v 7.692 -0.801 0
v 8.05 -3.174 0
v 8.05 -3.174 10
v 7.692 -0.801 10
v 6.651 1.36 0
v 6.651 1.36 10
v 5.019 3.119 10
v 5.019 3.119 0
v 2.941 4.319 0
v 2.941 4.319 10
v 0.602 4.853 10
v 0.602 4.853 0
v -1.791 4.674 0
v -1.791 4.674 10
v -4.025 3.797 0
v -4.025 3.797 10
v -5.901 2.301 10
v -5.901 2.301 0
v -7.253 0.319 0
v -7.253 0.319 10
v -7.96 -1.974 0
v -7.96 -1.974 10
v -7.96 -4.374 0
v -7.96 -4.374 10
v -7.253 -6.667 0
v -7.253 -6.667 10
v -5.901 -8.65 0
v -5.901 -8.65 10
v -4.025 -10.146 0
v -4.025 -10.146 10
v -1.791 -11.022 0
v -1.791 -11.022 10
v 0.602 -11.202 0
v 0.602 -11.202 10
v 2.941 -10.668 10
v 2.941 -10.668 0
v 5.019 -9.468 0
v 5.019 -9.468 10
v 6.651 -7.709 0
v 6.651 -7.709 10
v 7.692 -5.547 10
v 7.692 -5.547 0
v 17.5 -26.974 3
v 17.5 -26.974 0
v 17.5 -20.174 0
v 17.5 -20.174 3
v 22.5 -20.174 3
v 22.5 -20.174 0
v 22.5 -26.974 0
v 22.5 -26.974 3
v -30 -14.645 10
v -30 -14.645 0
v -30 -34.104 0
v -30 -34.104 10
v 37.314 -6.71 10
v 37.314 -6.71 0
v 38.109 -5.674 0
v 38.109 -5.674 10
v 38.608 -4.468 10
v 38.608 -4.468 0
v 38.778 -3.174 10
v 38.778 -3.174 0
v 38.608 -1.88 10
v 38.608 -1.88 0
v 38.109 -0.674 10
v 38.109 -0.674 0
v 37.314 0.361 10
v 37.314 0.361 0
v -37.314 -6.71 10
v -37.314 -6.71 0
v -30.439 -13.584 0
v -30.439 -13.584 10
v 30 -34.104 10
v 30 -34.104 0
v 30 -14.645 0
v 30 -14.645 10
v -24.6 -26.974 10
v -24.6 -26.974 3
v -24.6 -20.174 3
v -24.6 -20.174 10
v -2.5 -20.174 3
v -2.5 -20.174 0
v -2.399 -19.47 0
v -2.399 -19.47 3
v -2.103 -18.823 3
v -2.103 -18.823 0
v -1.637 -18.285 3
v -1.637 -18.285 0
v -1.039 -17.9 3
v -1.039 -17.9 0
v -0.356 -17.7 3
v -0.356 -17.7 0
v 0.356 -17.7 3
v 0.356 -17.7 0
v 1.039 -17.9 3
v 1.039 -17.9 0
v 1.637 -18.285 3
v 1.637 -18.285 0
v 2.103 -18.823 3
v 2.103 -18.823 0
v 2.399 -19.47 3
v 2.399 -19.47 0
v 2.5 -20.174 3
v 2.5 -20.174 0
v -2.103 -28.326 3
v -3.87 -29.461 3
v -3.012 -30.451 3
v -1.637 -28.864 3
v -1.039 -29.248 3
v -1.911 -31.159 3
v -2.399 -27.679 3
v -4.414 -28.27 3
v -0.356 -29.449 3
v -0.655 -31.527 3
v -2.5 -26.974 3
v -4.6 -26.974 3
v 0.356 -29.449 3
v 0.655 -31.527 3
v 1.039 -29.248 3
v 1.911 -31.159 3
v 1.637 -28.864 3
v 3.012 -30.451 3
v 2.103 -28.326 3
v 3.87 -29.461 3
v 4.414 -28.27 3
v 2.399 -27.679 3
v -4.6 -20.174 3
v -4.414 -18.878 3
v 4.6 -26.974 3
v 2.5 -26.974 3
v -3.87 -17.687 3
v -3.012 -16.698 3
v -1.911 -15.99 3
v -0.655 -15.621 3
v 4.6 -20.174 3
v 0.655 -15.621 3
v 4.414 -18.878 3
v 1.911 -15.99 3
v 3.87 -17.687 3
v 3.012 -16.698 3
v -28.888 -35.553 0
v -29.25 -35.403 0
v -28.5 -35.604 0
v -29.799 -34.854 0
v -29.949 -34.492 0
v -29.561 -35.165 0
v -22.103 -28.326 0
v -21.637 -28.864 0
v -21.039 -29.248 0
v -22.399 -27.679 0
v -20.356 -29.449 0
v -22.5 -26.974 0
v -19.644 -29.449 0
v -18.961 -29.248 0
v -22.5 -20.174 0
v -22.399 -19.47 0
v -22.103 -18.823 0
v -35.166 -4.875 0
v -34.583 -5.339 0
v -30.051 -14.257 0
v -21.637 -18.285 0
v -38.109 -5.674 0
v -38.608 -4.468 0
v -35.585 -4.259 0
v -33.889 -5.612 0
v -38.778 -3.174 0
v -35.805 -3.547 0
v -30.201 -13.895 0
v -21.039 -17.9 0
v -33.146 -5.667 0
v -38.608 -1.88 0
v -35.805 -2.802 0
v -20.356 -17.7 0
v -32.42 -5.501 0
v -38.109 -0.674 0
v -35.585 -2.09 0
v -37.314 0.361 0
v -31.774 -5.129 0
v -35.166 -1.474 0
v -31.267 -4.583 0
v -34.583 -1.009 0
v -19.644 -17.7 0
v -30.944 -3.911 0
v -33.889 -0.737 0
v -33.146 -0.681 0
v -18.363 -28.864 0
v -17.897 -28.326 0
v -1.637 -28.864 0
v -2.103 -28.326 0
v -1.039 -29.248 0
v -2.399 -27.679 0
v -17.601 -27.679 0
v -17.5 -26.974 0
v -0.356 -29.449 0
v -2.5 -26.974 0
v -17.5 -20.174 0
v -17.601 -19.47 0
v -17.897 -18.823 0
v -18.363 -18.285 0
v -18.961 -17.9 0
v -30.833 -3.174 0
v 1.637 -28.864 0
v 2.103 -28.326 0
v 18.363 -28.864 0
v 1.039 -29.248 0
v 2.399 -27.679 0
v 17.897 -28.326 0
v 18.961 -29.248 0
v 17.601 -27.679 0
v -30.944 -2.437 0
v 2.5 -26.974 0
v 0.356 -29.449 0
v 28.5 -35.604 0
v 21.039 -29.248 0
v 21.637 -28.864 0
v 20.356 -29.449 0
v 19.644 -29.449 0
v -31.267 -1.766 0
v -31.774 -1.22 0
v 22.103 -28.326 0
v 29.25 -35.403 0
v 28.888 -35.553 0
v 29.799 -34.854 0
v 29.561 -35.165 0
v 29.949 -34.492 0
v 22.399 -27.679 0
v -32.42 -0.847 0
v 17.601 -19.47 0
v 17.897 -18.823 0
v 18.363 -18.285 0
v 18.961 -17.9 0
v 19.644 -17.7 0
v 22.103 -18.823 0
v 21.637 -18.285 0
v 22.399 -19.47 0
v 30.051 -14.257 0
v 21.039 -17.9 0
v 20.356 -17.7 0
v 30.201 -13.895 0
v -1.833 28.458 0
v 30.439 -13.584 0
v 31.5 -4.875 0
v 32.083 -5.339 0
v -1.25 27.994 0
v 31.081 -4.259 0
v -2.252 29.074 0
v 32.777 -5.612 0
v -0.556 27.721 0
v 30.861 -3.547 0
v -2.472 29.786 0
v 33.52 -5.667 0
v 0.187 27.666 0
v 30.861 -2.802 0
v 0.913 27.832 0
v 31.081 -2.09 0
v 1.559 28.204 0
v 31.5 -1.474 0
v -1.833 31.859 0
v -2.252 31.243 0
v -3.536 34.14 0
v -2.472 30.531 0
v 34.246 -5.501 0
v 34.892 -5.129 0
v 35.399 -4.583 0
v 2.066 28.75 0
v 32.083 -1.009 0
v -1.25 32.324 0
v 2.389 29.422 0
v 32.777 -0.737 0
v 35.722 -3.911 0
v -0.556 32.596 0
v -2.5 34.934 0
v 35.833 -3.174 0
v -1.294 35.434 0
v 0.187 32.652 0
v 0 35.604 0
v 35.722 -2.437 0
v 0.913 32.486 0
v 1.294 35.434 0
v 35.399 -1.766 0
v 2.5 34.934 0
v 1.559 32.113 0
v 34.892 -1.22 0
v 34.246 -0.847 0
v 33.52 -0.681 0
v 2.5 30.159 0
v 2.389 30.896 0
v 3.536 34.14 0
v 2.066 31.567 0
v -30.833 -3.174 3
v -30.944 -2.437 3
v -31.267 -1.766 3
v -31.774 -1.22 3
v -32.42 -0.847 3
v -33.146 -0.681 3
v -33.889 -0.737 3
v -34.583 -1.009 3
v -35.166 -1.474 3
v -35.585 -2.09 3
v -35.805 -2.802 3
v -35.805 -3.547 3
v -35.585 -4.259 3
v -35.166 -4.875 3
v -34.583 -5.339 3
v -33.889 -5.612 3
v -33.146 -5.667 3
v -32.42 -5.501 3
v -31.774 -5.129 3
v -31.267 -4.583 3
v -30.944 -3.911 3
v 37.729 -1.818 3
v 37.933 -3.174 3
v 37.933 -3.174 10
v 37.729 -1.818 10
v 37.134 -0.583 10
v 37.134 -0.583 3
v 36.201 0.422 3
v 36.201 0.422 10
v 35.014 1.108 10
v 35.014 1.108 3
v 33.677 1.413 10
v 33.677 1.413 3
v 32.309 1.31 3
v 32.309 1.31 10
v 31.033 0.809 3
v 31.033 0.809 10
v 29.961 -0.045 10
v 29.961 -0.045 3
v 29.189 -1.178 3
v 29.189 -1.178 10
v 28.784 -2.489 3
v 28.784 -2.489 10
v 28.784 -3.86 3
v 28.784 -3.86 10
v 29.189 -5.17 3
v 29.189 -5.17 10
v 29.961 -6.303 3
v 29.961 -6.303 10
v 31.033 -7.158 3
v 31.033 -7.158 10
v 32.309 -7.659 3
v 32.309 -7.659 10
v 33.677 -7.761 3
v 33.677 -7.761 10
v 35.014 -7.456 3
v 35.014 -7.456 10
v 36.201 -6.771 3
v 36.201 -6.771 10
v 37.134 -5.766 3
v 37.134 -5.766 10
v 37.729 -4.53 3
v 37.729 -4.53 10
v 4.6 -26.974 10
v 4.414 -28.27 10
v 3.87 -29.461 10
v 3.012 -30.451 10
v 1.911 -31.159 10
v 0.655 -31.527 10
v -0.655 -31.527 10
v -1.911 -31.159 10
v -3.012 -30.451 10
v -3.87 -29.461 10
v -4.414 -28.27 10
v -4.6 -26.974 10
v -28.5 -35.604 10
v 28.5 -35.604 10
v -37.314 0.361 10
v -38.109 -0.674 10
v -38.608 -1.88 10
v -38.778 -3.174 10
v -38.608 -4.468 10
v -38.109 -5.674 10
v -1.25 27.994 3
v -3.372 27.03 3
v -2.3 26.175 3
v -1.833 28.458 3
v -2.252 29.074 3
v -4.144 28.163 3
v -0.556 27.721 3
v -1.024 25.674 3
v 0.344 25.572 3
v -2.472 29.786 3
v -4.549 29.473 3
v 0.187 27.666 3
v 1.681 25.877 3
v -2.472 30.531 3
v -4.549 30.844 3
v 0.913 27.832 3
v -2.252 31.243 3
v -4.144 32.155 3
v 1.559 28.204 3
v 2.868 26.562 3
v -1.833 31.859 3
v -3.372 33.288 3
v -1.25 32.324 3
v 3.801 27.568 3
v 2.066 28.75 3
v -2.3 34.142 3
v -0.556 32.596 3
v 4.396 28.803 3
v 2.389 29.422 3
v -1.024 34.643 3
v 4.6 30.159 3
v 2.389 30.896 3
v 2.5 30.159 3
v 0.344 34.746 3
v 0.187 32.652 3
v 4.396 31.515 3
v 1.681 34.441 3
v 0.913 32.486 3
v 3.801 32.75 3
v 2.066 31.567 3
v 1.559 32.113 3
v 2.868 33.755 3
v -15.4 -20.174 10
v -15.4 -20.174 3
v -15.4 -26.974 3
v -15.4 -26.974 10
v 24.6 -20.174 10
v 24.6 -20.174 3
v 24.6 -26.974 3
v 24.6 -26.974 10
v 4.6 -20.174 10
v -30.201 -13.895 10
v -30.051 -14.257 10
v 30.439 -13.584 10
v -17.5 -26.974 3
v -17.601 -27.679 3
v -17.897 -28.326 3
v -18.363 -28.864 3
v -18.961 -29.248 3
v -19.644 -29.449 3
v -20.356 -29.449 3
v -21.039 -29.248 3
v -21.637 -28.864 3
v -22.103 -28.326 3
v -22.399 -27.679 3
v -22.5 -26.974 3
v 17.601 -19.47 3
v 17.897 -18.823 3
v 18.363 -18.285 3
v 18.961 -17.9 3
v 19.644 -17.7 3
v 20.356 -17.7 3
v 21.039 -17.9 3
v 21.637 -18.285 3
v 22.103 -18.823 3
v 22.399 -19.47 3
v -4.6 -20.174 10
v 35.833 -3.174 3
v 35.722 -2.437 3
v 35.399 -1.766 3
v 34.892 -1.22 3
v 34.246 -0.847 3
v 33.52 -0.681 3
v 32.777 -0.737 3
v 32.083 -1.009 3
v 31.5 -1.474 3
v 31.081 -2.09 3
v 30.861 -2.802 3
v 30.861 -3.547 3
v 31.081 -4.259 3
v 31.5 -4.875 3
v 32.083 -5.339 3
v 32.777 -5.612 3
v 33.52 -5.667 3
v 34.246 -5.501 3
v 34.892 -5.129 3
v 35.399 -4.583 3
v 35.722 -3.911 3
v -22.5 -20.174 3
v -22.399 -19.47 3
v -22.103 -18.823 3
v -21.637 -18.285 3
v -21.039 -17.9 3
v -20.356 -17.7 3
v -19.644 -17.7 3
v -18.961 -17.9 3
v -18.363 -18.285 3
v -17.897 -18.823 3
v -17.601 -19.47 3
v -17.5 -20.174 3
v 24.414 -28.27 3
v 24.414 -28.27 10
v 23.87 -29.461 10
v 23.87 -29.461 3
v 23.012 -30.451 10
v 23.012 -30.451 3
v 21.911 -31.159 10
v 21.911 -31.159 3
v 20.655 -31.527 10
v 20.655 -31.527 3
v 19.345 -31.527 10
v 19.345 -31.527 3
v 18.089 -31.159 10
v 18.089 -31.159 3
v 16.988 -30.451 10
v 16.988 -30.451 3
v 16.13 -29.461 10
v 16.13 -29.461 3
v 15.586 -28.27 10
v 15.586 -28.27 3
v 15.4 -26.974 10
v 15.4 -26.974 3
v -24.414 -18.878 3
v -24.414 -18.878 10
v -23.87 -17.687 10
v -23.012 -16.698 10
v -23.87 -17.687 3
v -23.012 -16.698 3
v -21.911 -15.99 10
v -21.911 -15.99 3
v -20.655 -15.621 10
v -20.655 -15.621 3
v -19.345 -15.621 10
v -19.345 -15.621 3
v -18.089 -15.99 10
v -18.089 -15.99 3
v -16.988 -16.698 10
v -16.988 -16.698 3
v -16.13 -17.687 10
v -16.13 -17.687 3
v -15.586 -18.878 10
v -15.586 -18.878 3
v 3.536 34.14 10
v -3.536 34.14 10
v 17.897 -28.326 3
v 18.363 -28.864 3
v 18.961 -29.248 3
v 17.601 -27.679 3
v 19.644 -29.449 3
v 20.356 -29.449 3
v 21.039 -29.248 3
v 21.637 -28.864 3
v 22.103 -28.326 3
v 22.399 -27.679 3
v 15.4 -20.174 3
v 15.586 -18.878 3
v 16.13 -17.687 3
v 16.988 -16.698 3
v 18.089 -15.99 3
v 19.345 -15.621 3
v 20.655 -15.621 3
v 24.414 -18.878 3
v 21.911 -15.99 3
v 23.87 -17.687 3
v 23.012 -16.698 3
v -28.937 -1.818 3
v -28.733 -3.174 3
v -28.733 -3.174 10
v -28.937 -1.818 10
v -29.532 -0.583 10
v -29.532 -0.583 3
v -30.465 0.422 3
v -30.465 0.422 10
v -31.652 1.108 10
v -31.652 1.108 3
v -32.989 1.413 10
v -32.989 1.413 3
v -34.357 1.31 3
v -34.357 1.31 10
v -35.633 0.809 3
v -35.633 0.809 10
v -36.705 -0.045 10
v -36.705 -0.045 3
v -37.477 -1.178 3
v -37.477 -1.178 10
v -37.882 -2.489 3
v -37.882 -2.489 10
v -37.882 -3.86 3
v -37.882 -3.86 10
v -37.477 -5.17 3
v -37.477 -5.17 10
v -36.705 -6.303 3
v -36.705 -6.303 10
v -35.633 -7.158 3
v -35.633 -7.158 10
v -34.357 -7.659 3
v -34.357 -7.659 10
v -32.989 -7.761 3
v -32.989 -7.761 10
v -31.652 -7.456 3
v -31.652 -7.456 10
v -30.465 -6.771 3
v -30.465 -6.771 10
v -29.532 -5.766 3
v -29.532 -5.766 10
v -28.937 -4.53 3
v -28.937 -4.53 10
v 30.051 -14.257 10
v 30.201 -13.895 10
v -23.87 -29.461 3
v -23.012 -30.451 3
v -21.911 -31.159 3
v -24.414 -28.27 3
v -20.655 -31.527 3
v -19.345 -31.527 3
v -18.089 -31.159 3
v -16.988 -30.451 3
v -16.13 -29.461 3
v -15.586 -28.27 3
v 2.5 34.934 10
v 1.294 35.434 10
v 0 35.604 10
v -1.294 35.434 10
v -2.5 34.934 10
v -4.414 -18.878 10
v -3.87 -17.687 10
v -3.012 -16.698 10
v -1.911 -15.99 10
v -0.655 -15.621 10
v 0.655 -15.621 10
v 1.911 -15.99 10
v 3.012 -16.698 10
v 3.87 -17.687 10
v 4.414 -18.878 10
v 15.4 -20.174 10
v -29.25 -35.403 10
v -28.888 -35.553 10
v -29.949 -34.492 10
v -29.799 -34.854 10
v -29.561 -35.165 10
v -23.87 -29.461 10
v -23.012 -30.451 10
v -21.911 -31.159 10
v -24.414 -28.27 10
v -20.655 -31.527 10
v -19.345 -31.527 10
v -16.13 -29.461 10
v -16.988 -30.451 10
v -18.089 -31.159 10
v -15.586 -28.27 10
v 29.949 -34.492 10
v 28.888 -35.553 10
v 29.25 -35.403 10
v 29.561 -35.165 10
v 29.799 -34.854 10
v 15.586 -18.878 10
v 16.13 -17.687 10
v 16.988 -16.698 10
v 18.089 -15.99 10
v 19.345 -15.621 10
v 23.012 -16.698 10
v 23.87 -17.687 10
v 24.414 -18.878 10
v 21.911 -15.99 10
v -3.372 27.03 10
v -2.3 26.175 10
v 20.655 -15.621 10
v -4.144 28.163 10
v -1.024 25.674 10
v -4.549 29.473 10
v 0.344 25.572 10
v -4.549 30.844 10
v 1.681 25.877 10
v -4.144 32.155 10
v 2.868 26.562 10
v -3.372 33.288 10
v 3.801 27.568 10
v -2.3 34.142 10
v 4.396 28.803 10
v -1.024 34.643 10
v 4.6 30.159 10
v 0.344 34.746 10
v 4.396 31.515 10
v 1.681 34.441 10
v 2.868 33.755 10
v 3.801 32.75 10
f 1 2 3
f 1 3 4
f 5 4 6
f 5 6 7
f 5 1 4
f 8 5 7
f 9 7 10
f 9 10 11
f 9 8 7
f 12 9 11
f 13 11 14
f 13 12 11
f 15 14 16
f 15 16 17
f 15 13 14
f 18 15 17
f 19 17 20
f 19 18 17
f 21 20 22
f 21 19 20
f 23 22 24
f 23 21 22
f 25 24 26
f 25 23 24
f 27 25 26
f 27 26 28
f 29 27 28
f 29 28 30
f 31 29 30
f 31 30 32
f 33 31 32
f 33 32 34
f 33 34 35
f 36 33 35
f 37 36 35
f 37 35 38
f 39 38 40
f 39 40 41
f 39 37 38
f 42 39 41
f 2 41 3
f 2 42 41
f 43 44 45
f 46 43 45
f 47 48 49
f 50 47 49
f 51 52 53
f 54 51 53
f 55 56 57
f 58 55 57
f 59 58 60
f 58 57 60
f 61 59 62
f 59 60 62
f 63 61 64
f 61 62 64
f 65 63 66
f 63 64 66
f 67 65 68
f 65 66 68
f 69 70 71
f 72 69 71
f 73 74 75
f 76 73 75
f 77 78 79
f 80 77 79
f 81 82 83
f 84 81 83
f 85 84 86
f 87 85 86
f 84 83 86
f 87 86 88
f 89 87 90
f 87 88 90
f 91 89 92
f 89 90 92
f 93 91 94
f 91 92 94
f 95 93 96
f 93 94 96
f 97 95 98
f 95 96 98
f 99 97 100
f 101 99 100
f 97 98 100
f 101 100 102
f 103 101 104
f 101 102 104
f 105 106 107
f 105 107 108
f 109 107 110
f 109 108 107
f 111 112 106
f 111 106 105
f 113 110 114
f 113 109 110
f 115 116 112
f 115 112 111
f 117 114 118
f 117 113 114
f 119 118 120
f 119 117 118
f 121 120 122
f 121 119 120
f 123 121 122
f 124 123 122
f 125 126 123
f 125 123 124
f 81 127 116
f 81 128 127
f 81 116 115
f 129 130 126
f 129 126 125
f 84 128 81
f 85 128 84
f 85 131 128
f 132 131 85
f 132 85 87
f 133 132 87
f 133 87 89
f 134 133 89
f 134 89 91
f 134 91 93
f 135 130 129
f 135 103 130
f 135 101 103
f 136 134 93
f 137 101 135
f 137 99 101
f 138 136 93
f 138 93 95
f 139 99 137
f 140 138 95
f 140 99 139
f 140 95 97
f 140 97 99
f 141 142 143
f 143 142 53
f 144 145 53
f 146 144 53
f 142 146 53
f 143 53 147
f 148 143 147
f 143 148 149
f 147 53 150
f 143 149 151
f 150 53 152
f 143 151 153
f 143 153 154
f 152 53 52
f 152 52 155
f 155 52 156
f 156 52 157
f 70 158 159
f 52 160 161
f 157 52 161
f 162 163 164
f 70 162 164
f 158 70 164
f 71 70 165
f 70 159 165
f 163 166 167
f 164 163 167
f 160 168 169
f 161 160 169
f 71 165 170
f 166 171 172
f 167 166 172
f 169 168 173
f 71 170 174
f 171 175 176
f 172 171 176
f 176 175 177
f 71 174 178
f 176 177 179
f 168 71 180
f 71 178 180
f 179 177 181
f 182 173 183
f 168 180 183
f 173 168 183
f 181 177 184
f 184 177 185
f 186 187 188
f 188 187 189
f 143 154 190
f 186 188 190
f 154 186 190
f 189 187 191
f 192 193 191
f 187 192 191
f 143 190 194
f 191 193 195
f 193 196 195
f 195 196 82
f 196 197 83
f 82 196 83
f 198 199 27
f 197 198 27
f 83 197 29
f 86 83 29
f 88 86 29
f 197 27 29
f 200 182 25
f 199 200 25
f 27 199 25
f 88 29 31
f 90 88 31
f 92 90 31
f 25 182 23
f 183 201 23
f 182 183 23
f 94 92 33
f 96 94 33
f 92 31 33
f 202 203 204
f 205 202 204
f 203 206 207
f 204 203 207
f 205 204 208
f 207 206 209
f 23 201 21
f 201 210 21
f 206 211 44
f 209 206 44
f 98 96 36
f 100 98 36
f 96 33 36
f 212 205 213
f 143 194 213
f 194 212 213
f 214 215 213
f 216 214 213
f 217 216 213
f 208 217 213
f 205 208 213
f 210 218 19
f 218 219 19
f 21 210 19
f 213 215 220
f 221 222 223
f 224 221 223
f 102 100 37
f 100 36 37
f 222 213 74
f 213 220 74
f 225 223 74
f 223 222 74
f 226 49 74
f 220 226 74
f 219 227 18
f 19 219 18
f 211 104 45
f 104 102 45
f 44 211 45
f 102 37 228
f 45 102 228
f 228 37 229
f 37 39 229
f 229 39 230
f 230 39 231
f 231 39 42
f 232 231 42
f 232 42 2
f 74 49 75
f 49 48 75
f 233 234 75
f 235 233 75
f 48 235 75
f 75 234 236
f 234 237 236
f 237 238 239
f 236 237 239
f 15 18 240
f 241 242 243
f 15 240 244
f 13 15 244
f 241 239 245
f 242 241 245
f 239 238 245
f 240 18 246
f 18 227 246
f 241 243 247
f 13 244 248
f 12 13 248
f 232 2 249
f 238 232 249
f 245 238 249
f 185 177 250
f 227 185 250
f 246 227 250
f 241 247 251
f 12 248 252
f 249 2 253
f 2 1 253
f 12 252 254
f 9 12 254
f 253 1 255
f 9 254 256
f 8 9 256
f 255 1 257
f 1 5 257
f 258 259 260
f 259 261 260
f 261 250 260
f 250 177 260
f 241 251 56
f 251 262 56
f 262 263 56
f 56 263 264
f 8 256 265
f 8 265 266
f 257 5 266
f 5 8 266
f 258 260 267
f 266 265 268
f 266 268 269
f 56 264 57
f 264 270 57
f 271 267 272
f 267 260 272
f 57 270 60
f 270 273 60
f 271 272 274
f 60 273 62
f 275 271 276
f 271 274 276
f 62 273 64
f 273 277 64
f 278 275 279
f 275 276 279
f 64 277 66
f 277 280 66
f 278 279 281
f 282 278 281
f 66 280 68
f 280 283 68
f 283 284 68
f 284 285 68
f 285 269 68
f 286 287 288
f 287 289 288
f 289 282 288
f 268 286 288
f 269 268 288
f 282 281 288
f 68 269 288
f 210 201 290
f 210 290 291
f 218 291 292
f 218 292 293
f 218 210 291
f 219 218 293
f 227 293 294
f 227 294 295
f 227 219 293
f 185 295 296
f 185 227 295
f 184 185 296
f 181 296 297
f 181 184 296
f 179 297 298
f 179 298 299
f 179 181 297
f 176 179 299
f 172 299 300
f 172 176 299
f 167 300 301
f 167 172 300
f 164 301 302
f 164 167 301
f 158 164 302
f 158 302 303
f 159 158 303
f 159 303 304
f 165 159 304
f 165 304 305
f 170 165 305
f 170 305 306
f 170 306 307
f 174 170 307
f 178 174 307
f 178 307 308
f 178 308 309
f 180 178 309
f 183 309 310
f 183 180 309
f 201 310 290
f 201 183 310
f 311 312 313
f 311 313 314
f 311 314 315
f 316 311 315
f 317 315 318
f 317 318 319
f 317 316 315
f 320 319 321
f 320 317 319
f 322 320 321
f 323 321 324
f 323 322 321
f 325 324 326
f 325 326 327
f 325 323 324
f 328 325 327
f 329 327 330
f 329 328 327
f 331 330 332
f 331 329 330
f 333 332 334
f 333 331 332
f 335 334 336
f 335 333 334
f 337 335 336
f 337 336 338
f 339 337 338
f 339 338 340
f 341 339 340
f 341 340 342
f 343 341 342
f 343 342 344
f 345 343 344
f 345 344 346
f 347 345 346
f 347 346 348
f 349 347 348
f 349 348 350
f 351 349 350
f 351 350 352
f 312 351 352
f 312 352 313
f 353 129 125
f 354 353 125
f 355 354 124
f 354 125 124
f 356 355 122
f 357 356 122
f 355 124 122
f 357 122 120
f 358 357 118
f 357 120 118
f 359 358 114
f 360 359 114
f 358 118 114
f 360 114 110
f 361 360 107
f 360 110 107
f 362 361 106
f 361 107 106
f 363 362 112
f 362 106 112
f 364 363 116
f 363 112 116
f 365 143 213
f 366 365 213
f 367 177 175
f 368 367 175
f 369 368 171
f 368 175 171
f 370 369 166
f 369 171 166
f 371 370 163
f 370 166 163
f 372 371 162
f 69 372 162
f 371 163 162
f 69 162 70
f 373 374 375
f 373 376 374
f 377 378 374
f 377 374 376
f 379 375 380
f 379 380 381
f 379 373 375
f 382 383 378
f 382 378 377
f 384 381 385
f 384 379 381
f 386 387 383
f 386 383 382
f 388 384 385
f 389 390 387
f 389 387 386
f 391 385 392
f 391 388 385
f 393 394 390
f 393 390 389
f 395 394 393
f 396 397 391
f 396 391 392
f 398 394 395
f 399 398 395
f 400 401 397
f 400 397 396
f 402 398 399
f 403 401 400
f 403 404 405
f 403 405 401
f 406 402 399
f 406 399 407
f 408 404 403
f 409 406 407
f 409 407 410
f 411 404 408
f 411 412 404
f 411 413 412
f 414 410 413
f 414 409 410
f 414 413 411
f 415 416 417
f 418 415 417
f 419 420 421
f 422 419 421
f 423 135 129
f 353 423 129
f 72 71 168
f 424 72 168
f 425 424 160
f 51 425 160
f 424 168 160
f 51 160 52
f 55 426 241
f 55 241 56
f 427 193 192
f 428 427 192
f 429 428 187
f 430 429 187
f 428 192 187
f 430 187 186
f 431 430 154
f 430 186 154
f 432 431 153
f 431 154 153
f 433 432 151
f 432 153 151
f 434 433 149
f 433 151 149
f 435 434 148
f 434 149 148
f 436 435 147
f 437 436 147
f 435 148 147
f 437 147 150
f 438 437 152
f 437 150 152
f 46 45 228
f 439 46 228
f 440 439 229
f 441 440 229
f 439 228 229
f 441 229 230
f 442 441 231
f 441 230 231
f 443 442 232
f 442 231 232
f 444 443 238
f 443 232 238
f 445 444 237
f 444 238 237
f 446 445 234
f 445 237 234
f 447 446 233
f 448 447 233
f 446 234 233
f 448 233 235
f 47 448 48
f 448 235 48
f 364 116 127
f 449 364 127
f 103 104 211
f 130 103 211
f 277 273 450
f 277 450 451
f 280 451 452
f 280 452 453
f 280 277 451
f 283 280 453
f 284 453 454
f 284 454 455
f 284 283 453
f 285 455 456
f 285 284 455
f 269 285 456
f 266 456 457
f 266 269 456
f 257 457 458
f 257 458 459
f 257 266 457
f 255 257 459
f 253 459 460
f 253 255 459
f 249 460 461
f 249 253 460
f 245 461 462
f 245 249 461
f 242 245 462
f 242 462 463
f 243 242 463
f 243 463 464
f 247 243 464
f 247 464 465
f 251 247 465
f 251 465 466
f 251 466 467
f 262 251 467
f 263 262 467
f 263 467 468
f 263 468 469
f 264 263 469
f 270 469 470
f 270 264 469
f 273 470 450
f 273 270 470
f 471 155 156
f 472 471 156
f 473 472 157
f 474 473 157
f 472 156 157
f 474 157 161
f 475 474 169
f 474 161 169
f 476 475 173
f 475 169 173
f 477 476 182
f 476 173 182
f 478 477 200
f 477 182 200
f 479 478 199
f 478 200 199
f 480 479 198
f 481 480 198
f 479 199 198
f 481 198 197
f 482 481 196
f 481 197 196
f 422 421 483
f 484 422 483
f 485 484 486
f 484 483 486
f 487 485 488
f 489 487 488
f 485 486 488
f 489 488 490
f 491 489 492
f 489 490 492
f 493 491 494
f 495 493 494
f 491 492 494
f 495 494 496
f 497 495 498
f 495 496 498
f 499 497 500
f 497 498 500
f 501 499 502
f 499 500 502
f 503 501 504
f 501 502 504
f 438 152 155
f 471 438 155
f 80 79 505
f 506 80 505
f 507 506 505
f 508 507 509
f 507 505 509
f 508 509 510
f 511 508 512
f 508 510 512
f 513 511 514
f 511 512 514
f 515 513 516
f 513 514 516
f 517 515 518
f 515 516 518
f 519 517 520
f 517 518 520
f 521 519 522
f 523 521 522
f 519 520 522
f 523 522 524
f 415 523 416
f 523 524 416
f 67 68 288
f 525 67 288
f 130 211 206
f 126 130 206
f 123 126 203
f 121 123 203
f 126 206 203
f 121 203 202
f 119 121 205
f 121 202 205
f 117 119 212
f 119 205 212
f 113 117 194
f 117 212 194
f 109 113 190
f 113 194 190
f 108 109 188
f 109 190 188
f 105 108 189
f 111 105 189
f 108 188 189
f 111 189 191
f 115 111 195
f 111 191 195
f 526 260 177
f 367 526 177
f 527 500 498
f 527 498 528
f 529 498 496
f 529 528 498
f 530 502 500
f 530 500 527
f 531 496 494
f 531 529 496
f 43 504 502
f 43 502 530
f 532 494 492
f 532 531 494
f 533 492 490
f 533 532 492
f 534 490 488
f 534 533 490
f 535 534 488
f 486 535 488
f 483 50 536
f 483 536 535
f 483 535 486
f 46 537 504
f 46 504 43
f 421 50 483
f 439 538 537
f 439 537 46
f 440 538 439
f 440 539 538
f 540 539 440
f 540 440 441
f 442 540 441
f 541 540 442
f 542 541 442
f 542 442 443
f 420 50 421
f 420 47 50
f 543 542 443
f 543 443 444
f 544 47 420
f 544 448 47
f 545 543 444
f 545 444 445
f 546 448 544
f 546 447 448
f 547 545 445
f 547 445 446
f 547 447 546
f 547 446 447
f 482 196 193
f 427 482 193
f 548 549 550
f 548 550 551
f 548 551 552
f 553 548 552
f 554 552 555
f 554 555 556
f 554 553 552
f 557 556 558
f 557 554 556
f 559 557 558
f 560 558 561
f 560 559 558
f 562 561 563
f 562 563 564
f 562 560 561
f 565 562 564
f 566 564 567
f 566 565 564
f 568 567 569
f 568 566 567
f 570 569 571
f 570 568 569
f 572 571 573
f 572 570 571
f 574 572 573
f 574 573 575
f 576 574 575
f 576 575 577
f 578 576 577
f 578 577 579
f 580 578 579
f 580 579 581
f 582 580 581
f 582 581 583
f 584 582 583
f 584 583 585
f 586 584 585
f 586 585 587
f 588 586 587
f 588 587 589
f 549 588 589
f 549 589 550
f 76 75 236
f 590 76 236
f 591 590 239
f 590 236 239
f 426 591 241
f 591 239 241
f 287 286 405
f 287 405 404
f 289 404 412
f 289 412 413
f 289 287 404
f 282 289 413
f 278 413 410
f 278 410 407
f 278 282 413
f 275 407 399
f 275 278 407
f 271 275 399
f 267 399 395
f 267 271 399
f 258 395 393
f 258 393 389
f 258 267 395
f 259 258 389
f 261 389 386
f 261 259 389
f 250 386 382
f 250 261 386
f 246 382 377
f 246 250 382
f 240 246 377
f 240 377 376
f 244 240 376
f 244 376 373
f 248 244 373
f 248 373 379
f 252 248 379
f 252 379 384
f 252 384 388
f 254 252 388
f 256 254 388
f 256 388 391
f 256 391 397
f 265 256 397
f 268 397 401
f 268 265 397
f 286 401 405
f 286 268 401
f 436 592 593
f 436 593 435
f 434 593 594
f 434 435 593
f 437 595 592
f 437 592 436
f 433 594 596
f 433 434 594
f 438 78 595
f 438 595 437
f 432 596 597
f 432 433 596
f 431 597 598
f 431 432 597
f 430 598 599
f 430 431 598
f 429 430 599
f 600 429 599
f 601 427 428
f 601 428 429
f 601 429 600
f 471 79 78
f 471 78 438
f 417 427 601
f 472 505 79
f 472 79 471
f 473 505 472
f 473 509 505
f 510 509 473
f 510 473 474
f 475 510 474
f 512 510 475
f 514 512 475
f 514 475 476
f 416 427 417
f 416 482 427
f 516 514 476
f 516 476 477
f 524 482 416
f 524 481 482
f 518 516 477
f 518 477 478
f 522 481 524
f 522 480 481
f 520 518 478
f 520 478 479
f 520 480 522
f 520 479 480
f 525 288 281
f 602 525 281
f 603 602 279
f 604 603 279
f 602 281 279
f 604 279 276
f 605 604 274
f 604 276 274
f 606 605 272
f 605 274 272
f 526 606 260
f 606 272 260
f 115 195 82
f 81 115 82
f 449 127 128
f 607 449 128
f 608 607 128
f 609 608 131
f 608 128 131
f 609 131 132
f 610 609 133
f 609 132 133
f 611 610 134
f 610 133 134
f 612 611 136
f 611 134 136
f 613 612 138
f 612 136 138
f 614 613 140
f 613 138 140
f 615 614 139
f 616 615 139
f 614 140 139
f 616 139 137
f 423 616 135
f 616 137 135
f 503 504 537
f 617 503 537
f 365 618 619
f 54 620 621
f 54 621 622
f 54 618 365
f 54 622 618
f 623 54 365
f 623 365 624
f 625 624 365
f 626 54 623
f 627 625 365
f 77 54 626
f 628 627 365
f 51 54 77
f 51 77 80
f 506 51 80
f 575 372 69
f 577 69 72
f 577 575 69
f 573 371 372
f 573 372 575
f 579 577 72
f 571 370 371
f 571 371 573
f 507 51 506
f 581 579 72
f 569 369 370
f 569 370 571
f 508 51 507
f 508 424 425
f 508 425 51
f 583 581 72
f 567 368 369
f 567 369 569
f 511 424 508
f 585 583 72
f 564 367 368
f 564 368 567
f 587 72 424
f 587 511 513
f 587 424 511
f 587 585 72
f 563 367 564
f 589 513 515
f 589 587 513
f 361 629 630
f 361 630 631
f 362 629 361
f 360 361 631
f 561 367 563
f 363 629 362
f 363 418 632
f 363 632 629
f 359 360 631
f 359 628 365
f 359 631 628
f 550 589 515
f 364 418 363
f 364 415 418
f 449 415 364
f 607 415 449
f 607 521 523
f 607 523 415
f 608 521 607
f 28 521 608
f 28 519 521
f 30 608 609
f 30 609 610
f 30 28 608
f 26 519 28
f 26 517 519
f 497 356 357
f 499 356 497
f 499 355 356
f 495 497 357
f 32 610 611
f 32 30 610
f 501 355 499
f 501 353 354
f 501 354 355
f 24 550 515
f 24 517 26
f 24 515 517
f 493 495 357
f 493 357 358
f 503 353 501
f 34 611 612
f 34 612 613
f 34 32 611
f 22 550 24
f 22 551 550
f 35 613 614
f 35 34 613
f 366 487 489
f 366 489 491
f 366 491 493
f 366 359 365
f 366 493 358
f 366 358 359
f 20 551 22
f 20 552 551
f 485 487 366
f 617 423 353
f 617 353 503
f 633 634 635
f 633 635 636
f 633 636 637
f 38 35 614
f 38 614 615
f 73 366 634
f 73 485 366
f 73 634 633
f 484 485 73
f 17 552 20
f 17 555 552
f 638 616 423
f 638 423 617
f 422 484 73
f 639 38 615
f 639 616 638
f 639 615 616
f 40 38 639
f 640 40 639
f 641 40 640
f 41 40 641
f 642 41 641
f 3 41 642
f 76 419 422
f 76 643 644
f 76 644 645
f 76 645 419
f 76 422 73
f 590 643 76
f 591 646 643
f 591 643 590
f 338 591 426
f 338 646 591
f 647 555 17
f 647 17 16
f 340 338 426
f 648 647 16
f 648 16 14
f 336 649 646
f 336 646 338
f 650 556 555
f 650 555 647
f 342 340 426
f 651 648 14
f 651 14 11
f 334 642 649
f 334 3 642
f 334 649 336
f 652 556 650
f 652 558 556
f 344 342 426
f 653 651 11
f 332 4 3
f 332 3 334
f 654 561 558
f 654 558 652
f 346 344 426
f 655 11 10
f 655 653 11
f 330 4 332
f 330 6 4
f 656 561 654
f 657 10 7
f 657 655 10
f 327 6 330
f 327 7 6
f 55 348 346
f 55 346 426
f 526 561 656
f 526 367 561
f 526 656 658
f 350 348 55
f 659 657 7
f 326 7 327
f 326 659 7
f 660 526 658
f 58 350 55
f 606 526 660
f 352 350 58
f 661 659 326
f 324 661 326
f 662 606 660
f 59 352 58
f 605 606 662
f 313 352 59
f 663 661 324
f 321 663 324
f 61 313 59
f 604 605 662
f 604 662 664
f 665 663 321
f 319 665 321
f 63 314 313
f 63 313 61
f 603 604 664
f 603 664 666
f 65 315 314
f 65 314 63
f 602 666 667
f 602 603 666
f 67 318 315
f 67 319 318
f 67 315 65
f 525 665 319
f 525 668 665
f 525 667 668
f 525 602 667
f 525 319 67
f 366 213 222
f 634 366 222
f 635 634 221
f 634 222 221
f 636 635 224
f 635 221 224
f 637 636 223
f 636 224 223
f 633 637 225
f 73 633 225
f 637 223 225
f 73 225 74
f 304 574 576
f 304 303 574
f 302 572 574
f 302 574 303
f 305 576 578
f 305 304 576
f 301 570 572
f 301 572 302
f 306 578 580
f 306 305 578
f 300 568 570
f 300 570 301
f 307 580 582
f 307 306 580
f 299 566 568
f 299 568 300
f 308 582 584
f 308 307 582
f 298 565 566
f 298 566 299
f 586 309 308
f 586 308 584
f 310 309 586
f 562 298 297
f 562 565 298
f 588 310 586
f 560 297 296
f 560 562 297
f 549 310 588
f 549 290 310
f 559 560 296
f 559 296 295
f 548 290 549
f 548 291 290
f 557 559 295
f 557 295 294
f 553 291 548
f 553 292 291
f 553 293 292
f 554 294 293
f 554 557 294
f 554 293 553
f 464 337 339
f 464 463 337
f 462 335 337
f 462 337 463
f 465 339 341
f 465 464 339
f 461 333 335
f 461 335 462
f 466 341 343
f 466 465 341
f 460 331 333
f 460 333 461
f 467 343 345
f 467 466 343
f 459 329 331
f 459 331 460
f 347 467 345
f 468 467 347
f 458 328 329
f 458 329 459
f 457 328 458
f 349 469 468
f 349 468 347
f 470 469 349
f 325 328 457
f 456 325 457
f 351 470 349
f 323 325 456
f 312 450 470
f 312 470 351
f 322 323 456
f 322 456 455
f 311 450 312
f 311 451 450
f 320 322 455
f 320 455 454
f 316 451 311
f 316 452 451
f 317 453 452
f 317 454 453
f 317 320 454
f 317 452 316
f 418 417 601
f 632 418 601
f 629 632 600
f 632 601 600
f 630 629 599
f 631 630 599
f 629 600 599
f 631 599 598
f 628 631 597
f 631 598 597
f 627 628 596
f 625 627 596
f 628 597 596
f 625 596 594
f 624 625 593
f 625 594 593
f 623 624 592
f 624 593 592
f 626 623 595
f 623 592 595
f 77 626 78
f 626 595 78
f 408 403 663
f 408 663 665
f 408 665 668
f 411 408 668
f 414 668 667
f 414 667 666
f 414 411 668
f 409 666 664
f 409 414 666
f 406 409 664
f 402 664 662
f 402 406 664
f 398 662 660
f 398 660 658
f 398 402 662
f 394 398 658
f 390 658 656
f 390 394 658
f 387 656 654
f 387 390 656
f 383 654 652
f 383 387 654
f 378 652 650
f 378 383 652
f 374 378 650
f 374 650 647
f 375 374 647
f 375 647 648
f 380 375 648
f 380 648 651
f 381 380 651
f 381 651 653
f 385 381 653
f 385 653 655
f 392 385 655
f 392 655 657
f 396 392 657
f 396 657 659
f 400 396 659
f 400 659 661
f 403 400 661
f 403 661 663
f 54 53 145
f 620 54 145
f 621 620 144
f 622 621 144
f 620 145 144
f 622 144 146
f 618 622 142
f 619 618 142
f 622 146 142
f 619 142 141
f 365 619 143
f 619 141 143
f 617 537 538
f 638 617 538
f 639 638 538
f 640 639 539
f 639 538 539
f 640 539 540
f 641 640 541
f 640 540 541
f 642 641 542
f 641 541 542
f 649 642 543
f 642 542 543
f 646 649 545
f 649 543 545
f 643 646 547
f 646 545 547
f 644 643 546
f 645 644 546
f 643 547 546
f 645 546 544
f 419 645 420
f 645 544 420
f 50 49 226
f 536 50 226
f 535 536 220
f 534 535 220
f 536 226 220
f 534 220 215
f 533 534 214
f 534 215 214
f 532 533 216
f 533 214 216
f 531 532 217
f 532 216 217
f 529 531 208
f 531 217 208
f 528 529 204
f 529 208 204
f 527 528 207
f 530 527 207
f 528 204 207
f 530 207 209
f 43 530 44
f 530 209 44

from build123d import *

# Parameters (mm, degrees)
F0_R     = 4.6
F0_R_2   = 8.05
F1_DEPTH = 10
F0_R_3   = 2.5
F2_DEPTH = 3


# Not quite as in the source:
# - ends of sketch curves that miss each other by under 0.0002 mm in the source are joined


with BuildPart() as f1:
    # F0 (on Top) → F1 (new body)
    with BuildSketch(Plane.XY):
        with BuildLine():
            ThreePointArc((-30, -34.104246), (-29.5606601718, -35.1649061718), (-28.5, -35.604246))
            Line((-28.5, -35.604246), (28.5, -35.604246))
            ThreePointArc((28.5, -35.604246), (29.5606601718, -35.1649061718), (30, -34.104246))
            Line((30, -34.104246), (30, -14.645125))
            ThreePointArc((30, -14.645125), (30.1141807012, -14.0710998515), (30.4393398282, -13.5844648282))
            Line((30.4393398282, -13.5844648282), (37.314025, -6.70978))
            ThreePointArc((37.314025, -6.70978), (38.778491, -3.174246), (37.3140249059, 0.3612879059))
            Line((37.3140249059, 0.3612879059), (3.535534, 34.139779))
            ThreePointArc((3.535534, 34.139779), (0, 35.604245), (-3.5355339059, 34.1397789059))
            Line((-3.5355339059, 34.1397789059), (-37.314025, 0.361288))
            ThreePointArc((-37.314025, 0.361288), (-38.778491, -3.174246), (-37.3140249059, -6.7097799059))
            Line((-37.3140249059, -6.7097799059), (-30.43934, -13.584465))
            ThreePointArc((-30.43934, -13.584465), (-30.1141807012, -14.0710998515), (-30, -14.645125))
            Line((-30, -14.645125), (-30, -34.104246))
        make_face()
        with BuildLine():
            ThreePointArc((-24.6, -20.174246), (-20, -15.574246), (-15.4, -20.174246))
            Line((-15.4, -20.174246), (-15.4, -26.974246))
            ThreePointArc((-15.4, -26.974246), (-20, -31.574246), (-24.6, -26.974246))
            Line((-24.6, -26.974246), (-24.6, -20.174246))
        make_face(mode=Mode.SUBTRACT)
        with Locations((-33.333, -3.174246)):
            Circle(F0_R, mode=Mode.SUBTRACT)
        with BuildLine():
            ThreePointArc((4.6, -26.974246), (0, -31.574246), (-4.6, -26.974246))
            Line((-4.6, -26.974246), (-4.6, -20.174246))
            ThreePointArc((-4.6, -20.174246), (0, -15.574246), (4.6, -20.174246))
            Line((4.6, -20.174246), (4.6, -26.974246))
        make_face(mode=Mode.SUBTRACT)
        with BuildLine():
            ThreePointArc((24.6, -26.974246), (20, -31.574246), (15.4, -26.974246))
            Line((15.4, -26.974246), (15.4, -20.174246))
            ThreePointArc((15.4, -20.174246), (20, -15.574246), (24.6, -20.174246))
            Line((24.6, -20.174246), (24.6, -26.974246))
        make_face(mode=Mode.SUBTRACT)
        with Locations((0, -3.174246)):
            Circle(F0_R_2, mode=Mode.SUBTRACT)
        with Locations((33.333, -3.174246)):
            Circle(F0_R, mode=Mode.SUBTRACT)
        with Locations((0, 30.158782)):
            Circle(F0_R, mode=Mode.SUBTRACT)
    extrude(amount=F1_DEPTH)

    # F0 (on Top) → F2 (join)
    with BuildSketch(Plane.XY):
        with Locations((-33.333, -3.174246)):
            Circle(F0_R)
        with Locations((-33.333, -3.174246)):
            Circle(F0_R_3, mode=Mode.SUBTRACT)
        with BuildLine():
            Line((-15.4, -26.974246), (-15.4, -20.174246))
            ThreePointArc((-15.4, -20.174246), (-20, -15.574246), (-24.6, -20.174246))
            Line((-24.6, -20.174246), (-24.6, -26.974246))
            ThreePointArc((-24.6, -26.974246), (-20, -31.574246), (-15.4, -26.974246))
        make_face()
        with BuildLine():
            ThreePointArc((-17.5, -26.974246), (-20, -29.474246), (-22.5, -26.974246))
            Line((-22.5, -26.974246), (-22.5, -20.174246))
            ThreePointArc((-22.5, -20.174246), (-20, -17.674246), (-17.5, -20.174246))
            Line((-17.5, -20.174246), (-17.5, -26.974246))
        make_face(mode=Mode.SUBTRACT)
        with BuildLine():
            Line((-4.6, -20.174246), (-4.6, -26.974246))
            ThreePointArc((-4.6, -26.974246), (0, -31.574246), (4.6, -26.974246))
            Line((4.6, -26.974246), (4.6, -20.174246))
            ThreePointArc((4.6, -20.174246), (0, -15.574246), (-4.6, -20.174246))
        make_face()
        with BuildLine():
            ThreePointArc((2.5, -26.974246), (0, -29.474246), (-2.5, -26.974246))
            Line((-2.5, -26.974246), (-2.5, -20.174246))
            ThreePointArc((-2.5, -20.174246), (0, -17.674246), (2.5, -20.174246))
            Line((2.5, -20.174246), (2.5, -26.974246))
        make_face(mode=Mode.SUBTRACT)
        with BuildLine():
            Line((15.4, -20.174246), (15.4, -26.974246))
            ThreePointArc((15.4, -26.974246), (20, -31.574246), (24.6, -26.974246))
            Line((24.6, -26.974246), (24.6, -20.174246))
            ThreePointArc((24.6, -20.174246), (20, -15.574246), (15.4, -20.174246))
        make_face()
        with BuildLine():
            ThreePointArc((22.5, -26.974246), (20, -29.474246), (17.5, -26.974246))
            Line((17.5, -26.974246), (17.5, -20.174246))
            ThreePointArc((17.5, -20.174246), (20, -17.674246), (22.5, -20.174246))
            Line((22.5, -20.174246), (22.5, -26.974246))
        make_face(mode=Mode.SUBTRACT)
        with Locations((33.333, -3.174246)):
            Circle(F0_R)
        with Locations((33.333, -3.174246)):
            Circle(F0_R_3, mode=Mode.SUBTRACT)
        with Locations((0, 30.158782)):
            Circle(F0_R)
        with Locations((0, 30.158782)):
            Circle(F0_R_3, mode=Mode.SUBTRACT)
    extrude(amount=F2_DEPTH)


solid = f1.part
